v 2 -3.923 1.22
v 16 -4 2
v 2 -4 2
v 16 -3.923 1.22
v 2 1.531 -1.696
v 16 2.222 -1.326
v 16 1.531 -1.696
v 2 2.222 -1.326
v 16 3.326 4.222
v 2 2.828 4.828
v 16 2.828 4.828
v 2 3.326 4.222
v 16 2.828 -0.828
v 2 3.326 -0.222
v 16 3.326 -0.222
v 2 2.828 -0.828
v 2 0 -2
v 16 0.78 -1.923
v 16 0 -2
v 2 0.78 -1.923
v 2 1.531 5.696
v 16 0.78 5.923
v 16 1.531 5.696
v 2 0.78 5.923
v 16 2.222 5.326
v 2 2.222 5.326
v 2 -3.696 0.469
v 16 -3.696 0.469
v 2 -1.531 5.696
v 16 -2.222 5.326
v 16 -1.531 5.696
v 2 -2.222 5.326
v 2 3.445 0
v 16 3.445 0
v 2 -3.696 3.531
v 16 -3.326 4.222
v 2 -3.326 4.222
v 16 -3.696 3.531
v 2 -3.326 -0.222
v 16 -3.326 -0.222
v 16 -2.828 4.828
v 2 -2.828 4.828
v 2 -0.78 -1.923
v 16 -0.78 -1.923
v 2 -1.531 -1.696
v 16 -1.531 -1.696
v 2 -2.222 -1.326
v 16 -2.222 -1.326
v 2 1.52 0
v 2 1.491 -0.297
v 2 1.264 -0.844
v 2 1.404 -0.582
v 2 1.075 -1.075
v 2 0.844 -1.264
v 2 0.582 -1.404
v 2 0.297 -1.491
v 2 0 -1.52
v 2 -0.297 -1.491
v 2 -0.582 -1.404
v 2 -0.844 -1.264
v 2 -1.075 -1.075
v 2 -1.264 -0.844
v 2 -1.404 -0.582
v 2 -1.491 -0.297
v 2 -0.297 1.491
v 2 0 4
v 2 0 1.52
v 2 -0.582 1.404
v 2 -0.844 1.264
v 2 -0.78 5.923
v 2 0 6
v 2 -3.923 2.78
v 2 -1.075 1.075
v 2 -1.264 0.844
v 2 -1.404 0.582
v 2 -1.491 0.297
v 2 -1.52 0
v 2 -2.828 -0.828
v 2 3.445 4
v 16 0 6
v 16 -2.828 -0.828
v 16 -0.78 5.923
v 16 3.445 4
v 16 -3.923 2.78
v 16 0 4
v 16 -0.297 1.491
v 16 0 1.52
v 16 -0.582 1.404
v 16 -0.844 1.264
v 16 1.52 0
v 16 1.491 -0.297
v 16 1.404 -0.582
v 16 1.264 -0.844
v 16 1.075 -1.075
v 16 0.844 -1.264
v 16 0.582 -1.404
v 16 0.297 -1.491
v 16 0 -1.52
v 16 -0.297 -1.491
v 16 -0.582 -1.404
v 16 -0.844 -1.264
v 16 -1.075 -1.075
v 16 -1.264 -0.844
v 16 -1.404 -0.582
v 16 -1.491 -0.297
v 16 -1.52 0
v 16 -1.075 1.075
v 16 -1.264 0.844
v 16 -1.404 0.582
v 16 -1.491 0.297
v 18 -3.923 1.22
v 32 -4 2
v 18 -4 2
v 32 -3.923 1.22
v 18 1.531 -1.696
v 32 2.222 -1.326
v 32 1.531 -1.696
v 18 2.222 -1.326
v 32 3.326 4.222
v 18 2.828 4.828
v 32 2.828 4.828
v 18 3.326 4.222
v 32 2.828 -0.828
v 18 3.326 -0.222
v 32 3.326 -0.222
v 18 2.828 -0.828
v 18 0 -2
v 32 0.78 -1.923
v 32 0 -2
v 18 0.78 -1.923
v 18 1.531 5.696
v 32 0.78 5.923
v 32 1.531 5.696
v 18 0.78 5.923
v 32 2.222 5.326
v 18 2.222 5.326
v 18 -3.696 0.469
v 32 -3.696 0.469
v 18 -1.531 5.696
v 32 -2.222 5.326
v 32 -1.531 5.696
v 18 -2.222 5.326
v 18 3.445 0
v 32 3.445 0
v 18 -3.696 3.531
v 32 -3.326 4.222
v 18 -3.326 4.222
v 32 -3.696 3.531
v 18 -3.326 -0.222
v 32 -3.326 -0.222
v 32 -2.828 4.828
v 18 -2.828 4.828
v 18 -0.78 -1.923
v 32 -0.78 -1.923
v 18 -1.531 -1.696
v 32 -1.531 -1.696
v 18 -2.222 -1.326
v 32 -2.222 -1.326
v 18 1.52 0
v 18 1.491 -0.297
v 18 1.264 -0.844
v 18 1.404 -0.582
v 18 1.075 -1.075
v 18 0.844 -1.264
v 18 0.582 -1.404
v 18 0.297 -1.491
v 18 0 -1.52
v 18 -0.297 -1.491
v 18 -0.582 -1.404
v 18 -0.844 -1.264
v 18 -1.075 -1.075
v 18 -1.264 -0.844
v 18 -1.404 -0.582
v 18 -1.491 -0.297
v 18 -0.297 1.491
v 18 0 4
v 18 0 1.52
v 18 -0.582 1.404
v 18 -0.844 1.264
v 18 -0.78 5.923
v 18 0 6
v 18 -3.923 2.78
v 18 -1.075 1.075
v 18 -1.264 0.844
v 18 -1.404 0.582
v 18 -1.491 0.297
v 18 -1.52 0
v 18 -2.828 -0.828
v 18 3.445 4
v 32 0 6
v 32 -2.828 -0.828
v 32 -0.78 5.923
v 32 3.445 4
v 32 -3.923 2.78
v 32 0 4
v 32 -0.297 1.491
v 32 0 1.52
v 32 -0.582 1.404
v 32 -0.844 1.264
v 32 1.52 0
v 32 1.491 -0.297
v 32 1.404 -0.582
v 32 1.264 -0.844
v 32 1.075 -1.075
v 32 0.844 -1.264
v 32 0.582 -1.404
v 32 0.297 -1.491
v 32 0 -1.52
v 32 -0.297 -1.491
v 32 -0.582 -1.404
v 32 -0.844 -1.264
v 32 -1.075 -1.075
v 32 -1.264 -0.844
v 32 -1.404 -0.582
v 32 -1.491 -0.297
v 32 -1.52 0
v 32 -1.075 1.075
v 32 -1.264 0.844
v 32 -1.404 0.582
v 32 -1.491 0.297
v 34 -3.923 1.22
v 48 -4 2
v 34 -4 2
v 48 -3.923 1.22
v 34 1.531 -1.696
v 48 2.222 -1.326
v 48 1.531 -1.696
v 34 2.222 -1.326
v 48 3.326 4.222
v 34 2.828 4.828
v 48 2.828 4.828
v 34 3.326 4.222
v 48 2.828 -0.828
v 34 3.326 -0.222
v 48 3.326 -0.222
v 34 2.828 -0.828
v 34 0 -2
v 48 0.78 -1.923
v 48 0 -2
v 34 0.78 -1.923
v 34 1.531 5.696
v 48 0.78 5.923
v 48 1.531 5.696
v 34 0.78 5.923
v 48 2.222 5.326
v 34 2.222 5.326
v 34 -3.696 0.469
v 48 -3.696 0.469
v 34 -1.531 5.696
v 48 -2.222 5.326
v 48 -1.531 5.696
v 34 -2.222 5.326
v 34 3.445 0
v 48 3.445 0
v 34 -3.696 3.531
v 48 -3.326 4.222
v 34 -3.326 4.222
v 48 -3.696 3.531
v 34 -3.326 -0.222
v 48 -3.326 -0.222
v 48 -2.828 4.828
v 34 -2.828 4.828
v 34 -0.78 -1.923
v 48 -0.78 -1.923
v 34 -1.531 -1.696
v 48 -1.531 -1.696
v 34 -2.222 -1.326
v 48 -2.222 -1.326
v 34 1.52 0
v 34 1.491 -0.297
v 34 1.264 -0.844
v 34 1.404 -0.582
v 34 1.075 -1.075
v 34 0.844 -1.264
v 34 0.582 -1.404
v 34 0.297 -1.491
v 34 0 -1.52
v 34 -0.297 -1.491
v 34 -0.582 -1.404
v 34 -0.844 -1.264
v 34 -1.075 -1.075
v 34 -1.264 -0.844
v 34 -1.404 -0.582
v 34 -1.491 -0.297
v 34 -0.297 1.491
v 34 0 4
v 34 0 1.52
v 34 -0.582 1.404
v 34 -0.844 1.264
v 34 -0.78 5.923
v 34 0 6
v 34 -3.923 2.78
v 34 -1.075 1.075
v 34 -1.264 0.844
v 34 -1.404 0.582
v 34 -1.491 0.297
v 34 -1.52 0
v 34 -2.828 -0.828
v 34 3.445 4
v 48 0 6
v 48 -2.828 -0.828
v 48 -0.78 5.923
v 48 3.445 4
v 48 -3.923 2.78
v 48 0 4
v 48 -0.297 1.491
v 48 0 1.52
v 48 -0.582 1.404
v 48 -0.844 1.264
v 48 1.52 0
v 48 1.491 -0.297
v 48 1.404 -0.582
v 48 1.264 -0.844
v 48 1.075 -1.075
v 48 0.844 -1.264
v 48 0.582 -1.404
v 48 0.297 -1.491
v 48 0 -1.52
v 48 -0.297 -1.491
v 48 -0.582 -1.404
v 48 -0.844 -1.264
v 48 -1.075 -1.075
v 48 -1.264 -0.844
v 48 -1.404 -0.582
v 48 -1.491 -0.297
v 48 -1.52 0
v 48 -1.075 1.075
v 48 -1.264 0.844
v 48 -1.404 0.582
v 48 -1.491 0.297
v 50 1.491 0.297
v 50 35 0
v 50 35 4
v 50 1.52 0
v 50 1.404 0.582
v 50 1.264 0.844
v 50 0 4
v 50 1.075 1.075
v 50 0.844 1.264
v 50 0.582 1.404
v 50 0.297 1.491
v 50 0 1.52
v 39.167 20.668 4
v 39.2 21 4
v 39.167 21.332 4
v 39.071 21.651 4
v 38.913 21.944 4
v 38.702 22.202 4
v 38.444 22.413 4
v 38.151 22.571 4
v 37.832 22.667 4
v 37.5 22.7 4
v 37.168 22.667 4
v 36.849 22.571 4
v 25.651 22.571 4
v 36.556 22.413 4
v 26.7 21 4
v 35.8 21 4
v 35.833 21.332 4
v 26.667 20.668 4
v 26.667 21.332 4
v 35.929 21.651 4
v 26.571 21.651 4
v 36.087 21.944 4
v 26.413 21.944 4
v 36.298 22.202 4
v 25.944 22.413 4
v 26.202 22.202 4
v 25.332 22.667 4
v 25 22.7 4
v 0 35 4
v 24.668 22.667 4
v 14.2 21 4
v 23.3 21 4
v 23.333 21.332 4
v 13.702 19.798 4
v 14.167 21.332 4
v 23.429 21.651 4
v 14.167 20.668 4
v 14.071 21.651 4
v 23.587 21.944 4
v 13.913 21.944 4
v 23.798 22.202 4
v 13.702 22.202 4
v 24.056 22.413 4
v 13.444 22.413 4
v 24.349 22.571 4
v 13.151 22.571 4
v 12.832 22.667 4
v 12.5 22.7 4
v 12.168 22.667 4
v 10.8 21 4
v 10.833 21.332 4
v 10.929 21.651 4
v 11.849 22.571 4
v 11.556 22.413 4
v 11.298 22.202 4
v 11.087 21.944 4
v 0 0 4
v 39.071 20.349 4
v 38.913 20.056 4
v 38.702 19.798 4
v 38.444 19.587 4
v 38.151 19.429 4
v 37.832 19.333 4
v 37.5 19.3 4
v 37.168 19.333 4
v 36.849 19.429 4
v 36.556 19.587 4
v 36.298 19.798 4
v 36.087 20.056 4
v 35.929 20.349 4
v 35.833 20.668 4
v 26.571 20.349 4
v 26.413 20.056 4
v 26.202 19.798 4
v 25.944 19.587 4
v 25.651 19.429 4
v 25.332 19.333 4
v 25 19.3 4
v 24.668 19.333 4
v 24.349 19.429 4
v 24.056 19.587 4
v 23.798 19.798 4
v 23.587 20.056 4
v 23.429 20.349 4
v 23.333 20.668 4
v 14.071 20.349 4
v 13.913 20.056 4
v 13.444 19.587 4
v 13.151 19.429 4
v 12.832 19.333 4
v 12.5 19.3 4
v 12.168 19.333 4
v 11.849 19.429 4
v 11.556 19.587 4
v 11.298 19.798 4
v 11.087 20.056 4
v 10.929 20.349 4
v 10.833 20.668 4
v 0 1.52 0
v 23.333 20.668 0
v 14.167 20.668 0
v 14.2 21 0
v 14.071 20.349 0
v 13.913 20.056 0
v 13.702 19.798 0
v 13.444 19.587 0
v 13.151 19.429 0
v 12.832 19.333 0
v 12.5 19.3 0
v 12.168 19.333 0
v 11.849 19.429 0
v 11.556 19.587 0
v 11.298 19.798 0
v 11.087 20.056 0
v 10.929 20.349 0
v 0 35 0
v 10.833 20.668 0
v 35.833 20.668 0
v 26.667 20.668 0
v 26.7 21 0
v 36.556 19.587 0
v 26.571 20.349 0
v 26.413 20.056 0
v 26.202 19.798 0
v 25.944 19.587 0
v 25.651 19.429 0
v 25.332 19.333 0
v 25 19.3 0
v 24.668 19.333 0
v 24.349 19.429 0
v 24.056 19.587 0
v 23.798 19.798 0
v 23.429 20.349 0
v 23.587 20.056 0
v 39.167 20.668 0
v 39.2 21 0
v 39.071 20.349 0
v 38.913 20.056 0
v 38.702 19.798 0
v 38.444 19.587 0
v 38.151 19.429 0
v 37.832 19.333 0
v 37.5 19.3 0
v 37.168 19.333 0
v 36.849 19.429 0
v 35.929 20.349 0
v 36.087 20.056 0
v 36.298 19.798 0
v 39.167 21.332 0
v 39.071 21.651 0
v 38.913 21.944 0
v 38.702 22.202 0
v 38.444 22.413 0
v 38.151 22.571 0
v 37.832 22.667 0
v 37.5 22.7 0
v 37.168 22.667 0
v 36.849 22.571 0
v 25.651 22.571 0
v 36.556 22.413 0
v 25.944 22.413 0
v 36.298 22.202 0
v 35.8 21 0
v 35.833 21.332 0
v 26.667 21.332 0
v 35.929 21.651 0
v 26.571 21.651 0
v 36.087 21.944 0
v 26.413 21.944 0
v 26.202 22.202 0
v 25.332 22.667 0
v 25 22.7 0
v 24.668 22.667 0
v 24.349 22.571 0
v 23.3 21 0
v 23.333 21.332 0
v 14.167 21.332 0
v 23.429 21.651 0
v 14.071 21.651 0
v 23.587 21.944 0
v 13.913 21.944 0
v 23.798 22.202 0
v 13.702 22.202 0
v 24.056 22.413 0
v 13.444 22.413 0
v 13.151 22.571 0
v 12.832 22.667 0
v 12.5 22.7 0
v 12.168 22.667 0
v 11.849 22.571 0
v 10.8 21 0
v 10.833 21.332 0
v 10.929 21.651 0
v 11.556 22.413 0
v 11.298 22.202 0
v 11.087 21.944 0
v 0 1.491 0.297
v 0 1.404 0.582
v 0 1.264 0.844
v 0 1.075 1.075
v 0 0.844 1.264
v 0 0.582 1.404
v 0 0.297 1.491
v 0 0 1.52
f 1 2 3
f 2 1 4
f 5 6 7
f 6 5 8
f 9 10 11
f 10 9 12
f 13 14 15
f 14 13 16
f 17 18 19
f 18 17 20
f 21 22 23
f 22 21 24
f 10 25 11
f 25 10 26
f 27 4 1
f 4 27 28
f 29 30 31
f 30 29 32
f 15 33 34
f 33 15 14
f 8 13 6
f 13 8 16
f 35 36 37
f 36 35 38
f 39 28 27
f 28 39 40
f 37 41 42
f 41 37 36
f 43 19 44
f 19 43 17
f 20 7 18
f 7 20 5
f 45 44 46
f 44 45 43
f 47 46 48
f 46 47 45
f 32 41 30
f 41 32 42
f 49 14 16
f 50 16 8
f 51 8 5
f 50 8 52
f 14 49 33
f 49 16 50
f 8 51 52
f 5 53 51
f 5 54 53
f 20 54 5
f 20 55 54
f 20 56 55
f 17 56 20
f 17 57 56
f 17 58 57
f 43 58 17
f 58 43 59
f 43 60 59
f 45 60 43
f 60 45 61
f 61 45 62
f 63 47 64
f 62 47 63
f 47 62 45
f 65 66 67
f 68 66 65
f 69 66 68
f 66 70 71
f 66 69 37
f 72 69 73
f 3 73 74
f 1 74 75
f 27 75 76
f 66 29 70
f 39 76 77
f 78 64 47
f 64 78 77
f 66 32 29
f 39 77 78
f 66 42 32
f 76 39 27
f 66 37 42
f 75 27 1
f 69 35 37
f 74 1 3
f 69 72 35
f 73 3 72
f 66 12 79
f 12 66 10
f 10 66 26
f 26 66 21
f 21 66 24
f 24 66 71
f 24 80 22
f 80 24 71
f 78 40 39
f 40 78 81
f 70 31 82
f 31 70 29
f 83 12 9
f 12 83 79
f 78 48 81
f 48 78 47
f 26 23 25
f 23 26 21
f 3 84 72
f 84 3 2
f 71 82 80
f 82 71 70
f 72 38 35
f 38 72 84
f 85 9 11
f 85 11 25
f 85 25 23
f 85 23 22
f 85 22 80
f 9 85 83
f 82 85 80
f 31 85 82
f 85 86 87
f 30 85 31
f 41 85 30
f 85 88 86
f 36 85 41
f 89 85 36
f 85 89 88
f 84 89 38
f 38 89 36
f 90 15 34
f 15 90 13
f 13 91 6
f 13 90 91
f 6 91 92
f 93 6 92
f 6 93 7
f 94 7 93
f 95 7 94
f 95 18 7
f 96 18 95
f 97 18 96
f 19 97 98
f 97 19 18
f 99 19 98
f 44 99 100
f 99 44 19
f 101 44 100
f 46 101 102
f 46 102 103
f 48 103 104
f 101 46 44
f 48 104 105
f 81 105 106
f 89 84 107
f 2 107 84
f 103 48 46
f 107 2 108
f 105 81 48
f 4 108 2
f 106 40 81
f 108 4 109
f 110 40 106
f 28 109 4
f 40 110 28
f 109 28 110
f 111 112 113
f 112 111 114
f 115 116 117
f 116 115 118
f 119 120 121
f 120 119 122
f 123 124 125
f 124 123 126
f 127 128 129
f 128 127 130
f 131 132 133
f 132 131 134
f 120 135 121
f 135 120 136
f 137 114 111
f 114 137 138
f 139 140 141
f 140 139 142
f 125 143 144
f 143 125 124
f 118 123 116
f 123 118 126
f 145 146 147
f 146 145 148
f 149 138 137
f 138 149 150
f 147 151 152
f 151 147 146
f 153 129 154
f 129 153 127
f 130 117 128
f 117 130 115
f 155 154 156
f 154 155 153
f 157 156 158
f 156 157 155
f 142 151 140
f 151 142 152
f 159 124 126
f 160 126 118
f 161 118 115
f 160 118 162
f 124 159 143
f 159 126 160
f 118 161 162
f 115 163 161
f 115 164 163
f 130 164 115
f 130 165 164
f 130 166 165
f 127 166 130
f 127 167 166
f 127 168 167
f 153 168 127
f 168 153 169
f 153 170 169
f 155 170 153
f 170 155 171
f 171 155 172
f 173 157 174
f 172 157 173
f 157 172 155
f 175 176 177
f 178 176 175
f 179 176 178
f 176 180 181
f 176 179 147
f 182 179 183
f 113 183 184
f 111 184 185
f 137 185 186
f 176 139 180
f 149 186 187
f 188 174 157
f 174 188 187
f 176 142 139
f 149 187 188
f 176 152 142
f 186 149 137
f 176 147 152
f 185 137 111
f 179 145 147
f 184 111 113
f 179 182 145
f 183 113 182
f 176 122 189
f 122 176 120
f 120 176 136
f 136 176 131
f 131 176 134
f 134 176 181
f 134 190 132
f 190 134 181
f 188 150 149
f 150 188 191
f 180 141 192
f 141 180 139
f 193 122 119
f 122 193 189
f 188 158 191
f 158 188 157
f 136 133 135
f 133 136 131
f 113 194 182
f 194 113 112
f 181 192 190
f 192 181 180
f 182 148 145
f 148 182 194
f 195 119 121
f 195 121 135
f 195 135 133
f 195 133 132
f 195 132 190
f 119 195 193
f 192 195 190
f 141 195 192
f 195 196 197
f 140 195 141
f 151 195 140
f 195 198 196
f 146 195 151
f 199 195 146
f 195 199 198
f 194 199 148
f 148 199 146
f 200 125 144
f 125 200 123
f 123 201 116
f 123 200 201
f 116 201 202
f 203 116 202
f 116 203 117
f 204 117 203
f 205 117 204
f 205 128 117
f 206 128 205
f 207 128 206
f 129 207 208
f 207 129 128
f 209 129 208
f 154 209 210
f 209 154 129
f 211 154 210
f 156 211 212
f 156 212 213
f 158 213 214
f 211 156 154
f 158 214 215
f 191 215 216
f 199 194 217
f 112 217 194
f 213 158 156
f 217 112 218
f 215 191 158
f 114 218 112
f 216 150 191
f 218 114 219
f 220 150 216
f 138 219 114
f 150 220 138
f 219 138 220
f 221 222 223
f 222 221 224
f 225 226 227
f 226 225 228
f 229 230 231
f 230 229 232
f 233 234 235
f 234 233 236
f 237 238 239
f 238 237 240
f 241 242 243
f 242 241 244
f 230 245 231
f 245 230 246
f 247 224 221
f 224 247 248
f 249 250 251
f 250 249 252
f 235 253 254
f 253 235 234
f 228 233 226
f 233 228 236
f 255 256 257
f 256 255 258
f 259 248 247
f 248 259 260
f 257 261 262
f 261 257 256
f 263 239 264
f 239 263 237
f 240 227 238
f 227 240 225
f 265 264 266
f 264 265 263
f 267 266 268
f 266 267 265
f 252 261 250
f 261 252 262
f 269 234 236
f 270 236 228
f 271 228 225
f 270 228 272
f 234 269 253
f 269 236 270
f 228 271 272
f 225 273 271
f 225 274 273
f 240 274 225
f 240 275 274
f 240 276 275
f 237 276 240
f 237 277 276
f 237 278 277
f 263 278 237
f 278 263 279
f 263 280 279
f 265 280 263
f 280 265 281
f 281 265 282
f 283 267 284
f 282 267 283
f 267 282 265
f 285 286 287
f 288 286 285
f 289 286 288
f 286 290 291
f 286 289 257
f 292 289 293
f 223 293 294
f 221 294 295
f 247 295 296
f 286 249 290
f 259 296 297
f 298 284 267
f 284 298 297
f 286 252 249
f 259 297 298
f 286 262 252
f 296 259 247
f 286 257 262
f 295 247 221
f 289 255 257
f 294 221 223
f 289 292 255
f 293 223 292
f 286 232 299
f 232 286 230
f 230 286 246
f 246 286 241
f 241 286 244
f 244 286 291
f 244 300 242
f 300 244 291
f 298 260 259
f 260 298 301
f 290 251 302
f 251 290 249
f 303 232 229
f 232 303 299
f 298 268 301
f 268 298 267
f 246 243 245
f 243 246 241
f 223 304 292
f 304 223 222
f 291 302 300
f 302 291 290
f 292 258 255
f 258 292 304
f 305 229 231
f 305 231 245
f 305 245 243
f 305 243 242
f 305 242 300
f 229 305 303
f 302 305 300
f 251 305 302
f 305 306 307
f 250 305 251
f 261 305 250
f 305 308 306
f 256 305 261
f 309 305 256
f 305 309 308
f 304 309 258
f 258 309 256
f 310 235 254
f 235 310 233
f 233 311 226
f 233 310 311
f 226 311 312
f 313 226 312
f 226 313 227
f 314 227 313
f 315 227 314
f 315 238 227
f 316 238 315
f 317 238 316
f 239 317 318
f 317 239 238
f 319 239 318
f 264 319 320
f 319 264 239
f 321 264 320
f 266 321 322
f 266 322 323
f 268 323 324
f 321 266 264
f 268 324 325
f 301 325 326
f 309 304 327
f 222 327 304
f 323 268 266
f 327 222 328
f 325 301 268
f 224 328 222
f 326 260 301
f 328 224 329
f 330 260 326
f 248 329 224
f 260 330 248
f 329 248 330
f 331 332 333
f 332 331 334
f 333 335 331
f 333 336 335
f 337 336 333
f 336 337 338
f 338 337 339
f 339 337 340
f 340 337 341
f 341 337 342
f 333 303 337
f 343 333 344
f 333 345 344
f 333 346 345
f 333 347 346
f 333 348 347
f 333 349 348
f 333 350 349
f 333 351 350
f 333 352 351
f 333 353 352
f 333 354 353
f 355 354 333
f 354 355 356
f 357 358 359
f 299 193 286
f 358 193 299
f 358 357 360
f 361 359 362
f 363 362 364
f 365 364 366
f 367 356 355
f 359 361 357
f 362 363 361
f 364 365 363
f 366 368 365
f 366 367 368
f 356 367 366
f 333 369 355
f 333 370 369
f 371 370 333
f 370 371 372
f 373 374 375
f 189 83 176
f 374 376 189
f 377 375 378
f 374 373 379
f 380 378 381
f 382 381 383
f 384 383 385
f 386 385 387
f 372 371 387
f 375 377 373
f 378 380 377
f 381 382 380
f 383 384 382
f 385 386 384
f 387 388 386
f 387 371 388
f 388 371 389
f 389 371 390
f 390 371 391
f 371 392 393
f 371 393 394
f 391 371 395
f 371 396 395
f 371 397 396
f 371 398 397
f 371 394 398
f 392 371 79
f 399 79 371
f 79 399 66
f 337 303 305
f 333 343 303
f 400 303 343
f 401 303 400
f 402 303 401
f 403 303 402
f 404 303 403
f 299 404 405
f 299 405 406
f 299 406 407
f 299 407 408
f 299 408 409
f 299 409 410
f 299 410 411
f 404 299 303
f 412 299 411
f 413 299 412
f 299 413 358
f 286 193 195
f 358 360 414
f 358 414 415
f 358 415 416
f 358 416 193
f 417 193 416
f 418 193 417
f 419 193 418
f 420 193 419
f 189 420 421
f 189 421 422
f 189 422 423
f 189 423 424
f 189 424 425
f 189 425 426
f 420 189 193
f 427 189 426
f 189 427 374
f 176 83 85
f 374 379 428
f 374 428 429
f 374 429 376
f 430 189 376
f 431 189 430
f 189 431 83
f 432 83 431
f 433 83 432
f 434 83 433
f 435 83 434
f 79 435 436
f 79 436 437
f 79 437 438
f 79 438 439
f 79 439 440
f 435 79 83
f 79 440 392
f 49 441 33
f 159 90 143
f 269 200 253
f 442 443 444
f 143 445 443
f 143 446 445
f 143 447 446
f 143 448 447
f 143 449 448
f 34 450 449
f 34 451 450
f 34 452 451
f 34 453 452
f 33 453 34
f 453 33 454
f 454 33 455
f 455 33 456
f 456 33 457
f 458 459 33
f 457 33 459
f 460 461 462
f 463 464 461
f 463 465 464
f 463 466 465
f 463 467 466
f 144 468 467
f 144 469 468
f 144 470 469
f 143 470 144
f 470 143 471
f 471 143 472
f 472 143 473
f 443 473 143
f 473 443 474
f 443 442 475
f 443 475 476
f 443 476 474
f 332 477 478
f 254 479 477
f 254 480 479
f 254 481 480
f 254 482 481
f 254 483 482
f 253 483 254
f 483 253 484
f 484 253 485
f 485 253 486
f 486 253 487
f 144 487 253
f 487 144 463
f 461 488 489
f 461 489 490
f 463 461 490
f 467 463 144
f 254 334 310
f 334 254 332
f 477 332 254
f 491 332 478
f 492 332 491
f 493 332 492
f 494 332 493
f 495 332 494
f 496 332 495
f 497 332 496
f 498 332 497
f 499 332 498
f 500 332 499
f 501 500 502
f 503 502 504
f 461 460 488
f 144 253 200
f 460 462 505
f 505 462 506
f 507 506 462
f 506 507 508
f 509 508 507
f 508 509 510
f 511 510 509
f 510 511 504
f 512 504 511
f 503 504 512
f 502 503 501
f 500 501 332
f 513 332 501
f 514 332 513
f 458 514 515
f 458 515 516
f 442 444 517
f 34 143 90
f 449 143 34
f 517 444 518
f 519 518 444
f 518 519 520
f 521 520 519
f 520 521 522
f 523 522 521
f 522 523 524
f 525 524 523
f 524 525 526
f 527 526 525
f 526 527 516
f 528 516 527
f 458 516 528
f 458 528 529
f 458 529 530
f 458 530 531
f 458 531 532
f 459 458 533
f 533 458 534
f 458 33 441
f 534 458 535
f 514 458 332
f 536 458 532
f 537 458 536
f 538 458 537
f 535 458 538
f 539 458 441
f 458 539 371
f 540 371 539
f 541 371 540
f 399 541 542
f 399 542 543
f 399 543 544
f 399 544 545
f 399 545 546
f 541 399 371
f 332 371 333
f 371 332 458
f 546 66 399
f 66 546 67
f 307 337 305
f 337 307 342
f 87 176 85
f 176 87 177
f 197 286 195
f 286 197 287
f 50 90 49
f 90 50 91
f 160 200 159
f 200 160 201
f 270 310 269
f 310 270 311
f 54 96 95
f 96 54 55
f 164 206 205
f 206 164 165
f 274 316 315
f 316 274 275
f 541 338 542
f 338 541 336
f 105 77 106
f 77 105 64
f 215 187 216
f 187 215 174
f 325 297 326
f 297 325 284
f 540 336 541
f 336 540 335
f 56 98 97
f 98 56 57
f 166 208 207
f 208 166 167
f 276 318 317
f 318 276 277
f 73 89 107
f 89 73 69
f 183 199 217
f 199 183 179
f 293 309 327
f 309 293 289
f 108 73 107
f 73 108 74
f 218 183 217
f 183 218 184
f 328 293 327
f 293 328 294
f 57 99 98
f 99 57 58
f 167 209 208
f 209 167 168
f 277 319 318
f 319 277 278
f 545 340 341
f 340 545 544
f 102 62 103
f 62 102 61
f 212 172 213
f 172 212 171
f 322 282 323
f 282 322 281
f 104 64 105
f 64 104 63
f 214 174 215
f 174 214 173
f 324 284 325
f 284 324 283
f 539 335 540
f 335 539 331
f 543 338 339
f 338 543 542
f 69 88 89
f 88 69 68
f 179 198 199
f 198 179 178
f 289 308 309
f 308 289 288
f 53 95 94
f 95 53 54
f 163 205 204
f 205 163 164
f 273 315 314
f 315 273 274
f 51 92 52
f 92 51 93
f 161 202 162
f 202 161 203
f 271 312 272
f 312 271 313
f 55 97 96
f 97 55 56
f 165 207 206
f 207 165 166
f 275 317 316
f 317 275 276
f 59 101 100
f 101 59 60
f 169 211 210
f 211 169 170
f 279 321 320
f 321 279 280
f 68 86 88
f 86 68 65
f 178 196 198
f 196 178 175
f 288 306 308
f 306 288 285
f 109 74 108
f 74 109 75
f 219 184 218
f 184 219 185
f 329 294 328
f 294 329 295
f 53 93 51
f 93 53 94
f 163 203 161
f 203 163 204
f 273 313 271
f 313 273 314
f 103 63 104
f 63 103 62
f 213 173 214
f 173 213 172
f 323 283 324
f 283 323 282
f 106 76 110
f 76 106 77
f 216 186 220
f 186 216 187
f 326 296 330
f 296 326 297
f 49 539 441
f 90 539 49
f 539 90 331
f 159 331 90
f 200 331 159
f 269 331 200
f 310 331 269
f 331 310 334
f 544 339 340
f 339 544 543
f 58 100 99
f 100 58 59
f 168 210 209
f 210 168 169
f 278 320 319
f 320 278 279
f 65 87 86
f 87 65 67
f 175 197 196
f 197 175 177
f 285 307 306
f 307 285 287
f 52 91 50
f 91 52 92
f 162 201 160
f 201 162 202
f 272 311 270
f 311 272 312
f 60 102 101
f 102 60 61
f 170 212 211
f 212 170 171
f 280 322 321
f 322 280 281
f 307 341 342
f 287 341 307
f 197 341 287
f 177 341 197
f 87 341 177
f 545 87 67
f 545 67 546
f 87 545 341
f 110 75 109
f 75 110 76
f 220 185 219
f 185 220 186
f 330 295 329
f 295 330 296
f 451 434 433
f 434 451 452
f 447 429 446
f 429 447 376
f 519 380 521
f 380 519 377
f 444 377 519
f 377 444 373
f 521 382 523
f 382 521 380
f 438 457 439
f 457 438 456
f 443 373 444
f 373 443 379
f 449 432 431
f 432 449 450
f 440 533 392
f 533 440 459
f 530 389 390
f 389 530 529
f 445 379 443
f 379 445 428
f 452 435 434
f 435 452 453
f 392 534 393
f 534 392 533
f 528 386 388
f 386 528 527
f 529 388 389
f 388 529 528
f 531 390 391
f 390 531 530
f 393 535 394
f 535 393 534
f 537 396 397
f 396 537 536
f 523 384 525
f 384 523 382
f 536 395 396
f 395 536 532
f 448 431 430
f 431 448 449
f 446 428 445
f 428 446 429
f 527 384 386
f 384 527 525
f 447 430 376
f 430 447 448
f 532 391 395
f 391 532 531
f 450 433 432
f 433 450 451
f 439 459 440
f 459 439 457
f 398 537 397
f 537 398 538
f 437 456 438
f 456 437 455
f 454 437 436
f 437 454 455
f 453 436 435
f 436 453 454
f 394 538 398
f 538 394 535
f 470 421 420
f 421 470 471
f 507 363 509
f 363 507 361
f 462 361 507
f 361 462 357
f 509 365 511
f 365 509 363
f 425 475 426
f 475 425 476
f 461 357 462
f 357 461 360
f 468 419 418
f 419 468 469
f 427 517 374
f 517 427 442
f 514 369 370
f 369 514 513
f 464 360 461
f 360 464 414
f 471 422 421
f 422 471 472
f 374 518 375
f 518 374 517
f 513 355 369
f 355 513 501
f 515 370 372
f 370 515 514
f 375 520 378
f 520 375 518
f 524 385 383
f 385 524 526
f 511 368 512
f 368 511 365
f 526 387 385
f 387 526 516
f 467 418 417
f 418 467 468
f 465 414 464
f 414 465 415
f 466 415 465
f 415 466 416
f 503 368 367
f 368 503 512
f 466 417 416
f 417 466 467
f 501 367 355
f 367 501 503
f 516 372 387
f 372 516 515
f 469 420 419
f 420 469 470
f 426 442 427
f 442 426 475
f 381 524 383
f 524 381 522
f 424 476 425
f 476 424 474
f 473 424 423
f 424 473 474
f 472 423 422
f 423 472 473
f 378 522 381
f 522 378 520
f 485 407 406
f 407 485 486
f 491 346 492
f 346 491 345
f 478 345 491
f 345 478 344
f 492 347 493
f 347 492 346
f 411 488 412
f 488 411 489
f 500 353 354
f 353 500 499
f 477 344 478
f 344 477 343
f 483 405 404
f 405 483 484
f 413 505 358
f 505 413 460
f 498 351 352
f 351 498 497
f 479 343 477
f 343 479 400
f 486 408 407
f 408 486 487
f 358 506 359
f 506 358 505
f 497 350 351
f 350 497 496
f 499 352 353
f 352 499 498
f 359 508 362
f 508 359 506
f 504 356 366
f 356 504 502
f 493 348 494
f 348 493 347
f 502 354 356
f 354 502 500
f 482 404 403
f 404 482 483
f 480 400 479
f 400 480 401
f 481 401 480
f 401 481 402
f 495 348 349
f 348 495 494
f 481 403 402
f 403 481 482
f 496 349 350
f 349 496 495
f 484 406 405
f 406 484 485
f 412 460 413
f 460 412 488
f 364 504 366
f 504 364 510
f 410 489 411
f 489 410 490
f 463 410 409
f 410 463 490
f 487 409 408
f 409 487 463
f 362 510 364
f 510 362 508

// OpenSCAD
$fn = 32;

// ----------------------------------------------------------------------
// Hinge leaf: 50 x 39 x 8 mm
// ----------------------------------------------------------------------

// --- parameters (mm) ---
tab_len = 50;             // leaf length, X
tab_w = 35;               // leaf width, Y
tab_t = 4;                // leaf thickness
ring_d = 8;               // knuckle diameter
ring_w = 14;              // knuckle width
knuckle_n = 3;            // number of knuckles
pin_d = 3.04;             // pin bore
gap = 2;                  // gap between the knuckles
screw_d = 3.4;            // screw clearance

module leaf() {
  cube([tab_len, tab_w, tab_t]);
}

module knuckles() {
  /* barrels sit on the leaf edge, the pin axis at half the leaf thickness */
  for (i = [0 : knuckle_n - 1])
    translate([gap + i * (ring_w + gap), 0, tab_t * 0.5])
      rotate([0, 90, 0]) cylinder(h = ring_w, d = ring_d);
}

difference() {
  union() {
    leaf();
    knuckles();
  }
  rotate([0, 90, 0]) translate([0, 0, -1])
    cylinder(h = tab_len + 2, d = pin_d);
  translate([12.5, tab_w * 0.6, -1]) cylinder(h = tab_t + 2, d = screw_d);
  translate([25, tab_w * 0.6, -1]) cylinder(h = tab_t + 2, d = screw_d);
  translate([37.5, tab_w * 0.6, -1]) cylinder(h = tab_t + 2, d = screw_d);
}
